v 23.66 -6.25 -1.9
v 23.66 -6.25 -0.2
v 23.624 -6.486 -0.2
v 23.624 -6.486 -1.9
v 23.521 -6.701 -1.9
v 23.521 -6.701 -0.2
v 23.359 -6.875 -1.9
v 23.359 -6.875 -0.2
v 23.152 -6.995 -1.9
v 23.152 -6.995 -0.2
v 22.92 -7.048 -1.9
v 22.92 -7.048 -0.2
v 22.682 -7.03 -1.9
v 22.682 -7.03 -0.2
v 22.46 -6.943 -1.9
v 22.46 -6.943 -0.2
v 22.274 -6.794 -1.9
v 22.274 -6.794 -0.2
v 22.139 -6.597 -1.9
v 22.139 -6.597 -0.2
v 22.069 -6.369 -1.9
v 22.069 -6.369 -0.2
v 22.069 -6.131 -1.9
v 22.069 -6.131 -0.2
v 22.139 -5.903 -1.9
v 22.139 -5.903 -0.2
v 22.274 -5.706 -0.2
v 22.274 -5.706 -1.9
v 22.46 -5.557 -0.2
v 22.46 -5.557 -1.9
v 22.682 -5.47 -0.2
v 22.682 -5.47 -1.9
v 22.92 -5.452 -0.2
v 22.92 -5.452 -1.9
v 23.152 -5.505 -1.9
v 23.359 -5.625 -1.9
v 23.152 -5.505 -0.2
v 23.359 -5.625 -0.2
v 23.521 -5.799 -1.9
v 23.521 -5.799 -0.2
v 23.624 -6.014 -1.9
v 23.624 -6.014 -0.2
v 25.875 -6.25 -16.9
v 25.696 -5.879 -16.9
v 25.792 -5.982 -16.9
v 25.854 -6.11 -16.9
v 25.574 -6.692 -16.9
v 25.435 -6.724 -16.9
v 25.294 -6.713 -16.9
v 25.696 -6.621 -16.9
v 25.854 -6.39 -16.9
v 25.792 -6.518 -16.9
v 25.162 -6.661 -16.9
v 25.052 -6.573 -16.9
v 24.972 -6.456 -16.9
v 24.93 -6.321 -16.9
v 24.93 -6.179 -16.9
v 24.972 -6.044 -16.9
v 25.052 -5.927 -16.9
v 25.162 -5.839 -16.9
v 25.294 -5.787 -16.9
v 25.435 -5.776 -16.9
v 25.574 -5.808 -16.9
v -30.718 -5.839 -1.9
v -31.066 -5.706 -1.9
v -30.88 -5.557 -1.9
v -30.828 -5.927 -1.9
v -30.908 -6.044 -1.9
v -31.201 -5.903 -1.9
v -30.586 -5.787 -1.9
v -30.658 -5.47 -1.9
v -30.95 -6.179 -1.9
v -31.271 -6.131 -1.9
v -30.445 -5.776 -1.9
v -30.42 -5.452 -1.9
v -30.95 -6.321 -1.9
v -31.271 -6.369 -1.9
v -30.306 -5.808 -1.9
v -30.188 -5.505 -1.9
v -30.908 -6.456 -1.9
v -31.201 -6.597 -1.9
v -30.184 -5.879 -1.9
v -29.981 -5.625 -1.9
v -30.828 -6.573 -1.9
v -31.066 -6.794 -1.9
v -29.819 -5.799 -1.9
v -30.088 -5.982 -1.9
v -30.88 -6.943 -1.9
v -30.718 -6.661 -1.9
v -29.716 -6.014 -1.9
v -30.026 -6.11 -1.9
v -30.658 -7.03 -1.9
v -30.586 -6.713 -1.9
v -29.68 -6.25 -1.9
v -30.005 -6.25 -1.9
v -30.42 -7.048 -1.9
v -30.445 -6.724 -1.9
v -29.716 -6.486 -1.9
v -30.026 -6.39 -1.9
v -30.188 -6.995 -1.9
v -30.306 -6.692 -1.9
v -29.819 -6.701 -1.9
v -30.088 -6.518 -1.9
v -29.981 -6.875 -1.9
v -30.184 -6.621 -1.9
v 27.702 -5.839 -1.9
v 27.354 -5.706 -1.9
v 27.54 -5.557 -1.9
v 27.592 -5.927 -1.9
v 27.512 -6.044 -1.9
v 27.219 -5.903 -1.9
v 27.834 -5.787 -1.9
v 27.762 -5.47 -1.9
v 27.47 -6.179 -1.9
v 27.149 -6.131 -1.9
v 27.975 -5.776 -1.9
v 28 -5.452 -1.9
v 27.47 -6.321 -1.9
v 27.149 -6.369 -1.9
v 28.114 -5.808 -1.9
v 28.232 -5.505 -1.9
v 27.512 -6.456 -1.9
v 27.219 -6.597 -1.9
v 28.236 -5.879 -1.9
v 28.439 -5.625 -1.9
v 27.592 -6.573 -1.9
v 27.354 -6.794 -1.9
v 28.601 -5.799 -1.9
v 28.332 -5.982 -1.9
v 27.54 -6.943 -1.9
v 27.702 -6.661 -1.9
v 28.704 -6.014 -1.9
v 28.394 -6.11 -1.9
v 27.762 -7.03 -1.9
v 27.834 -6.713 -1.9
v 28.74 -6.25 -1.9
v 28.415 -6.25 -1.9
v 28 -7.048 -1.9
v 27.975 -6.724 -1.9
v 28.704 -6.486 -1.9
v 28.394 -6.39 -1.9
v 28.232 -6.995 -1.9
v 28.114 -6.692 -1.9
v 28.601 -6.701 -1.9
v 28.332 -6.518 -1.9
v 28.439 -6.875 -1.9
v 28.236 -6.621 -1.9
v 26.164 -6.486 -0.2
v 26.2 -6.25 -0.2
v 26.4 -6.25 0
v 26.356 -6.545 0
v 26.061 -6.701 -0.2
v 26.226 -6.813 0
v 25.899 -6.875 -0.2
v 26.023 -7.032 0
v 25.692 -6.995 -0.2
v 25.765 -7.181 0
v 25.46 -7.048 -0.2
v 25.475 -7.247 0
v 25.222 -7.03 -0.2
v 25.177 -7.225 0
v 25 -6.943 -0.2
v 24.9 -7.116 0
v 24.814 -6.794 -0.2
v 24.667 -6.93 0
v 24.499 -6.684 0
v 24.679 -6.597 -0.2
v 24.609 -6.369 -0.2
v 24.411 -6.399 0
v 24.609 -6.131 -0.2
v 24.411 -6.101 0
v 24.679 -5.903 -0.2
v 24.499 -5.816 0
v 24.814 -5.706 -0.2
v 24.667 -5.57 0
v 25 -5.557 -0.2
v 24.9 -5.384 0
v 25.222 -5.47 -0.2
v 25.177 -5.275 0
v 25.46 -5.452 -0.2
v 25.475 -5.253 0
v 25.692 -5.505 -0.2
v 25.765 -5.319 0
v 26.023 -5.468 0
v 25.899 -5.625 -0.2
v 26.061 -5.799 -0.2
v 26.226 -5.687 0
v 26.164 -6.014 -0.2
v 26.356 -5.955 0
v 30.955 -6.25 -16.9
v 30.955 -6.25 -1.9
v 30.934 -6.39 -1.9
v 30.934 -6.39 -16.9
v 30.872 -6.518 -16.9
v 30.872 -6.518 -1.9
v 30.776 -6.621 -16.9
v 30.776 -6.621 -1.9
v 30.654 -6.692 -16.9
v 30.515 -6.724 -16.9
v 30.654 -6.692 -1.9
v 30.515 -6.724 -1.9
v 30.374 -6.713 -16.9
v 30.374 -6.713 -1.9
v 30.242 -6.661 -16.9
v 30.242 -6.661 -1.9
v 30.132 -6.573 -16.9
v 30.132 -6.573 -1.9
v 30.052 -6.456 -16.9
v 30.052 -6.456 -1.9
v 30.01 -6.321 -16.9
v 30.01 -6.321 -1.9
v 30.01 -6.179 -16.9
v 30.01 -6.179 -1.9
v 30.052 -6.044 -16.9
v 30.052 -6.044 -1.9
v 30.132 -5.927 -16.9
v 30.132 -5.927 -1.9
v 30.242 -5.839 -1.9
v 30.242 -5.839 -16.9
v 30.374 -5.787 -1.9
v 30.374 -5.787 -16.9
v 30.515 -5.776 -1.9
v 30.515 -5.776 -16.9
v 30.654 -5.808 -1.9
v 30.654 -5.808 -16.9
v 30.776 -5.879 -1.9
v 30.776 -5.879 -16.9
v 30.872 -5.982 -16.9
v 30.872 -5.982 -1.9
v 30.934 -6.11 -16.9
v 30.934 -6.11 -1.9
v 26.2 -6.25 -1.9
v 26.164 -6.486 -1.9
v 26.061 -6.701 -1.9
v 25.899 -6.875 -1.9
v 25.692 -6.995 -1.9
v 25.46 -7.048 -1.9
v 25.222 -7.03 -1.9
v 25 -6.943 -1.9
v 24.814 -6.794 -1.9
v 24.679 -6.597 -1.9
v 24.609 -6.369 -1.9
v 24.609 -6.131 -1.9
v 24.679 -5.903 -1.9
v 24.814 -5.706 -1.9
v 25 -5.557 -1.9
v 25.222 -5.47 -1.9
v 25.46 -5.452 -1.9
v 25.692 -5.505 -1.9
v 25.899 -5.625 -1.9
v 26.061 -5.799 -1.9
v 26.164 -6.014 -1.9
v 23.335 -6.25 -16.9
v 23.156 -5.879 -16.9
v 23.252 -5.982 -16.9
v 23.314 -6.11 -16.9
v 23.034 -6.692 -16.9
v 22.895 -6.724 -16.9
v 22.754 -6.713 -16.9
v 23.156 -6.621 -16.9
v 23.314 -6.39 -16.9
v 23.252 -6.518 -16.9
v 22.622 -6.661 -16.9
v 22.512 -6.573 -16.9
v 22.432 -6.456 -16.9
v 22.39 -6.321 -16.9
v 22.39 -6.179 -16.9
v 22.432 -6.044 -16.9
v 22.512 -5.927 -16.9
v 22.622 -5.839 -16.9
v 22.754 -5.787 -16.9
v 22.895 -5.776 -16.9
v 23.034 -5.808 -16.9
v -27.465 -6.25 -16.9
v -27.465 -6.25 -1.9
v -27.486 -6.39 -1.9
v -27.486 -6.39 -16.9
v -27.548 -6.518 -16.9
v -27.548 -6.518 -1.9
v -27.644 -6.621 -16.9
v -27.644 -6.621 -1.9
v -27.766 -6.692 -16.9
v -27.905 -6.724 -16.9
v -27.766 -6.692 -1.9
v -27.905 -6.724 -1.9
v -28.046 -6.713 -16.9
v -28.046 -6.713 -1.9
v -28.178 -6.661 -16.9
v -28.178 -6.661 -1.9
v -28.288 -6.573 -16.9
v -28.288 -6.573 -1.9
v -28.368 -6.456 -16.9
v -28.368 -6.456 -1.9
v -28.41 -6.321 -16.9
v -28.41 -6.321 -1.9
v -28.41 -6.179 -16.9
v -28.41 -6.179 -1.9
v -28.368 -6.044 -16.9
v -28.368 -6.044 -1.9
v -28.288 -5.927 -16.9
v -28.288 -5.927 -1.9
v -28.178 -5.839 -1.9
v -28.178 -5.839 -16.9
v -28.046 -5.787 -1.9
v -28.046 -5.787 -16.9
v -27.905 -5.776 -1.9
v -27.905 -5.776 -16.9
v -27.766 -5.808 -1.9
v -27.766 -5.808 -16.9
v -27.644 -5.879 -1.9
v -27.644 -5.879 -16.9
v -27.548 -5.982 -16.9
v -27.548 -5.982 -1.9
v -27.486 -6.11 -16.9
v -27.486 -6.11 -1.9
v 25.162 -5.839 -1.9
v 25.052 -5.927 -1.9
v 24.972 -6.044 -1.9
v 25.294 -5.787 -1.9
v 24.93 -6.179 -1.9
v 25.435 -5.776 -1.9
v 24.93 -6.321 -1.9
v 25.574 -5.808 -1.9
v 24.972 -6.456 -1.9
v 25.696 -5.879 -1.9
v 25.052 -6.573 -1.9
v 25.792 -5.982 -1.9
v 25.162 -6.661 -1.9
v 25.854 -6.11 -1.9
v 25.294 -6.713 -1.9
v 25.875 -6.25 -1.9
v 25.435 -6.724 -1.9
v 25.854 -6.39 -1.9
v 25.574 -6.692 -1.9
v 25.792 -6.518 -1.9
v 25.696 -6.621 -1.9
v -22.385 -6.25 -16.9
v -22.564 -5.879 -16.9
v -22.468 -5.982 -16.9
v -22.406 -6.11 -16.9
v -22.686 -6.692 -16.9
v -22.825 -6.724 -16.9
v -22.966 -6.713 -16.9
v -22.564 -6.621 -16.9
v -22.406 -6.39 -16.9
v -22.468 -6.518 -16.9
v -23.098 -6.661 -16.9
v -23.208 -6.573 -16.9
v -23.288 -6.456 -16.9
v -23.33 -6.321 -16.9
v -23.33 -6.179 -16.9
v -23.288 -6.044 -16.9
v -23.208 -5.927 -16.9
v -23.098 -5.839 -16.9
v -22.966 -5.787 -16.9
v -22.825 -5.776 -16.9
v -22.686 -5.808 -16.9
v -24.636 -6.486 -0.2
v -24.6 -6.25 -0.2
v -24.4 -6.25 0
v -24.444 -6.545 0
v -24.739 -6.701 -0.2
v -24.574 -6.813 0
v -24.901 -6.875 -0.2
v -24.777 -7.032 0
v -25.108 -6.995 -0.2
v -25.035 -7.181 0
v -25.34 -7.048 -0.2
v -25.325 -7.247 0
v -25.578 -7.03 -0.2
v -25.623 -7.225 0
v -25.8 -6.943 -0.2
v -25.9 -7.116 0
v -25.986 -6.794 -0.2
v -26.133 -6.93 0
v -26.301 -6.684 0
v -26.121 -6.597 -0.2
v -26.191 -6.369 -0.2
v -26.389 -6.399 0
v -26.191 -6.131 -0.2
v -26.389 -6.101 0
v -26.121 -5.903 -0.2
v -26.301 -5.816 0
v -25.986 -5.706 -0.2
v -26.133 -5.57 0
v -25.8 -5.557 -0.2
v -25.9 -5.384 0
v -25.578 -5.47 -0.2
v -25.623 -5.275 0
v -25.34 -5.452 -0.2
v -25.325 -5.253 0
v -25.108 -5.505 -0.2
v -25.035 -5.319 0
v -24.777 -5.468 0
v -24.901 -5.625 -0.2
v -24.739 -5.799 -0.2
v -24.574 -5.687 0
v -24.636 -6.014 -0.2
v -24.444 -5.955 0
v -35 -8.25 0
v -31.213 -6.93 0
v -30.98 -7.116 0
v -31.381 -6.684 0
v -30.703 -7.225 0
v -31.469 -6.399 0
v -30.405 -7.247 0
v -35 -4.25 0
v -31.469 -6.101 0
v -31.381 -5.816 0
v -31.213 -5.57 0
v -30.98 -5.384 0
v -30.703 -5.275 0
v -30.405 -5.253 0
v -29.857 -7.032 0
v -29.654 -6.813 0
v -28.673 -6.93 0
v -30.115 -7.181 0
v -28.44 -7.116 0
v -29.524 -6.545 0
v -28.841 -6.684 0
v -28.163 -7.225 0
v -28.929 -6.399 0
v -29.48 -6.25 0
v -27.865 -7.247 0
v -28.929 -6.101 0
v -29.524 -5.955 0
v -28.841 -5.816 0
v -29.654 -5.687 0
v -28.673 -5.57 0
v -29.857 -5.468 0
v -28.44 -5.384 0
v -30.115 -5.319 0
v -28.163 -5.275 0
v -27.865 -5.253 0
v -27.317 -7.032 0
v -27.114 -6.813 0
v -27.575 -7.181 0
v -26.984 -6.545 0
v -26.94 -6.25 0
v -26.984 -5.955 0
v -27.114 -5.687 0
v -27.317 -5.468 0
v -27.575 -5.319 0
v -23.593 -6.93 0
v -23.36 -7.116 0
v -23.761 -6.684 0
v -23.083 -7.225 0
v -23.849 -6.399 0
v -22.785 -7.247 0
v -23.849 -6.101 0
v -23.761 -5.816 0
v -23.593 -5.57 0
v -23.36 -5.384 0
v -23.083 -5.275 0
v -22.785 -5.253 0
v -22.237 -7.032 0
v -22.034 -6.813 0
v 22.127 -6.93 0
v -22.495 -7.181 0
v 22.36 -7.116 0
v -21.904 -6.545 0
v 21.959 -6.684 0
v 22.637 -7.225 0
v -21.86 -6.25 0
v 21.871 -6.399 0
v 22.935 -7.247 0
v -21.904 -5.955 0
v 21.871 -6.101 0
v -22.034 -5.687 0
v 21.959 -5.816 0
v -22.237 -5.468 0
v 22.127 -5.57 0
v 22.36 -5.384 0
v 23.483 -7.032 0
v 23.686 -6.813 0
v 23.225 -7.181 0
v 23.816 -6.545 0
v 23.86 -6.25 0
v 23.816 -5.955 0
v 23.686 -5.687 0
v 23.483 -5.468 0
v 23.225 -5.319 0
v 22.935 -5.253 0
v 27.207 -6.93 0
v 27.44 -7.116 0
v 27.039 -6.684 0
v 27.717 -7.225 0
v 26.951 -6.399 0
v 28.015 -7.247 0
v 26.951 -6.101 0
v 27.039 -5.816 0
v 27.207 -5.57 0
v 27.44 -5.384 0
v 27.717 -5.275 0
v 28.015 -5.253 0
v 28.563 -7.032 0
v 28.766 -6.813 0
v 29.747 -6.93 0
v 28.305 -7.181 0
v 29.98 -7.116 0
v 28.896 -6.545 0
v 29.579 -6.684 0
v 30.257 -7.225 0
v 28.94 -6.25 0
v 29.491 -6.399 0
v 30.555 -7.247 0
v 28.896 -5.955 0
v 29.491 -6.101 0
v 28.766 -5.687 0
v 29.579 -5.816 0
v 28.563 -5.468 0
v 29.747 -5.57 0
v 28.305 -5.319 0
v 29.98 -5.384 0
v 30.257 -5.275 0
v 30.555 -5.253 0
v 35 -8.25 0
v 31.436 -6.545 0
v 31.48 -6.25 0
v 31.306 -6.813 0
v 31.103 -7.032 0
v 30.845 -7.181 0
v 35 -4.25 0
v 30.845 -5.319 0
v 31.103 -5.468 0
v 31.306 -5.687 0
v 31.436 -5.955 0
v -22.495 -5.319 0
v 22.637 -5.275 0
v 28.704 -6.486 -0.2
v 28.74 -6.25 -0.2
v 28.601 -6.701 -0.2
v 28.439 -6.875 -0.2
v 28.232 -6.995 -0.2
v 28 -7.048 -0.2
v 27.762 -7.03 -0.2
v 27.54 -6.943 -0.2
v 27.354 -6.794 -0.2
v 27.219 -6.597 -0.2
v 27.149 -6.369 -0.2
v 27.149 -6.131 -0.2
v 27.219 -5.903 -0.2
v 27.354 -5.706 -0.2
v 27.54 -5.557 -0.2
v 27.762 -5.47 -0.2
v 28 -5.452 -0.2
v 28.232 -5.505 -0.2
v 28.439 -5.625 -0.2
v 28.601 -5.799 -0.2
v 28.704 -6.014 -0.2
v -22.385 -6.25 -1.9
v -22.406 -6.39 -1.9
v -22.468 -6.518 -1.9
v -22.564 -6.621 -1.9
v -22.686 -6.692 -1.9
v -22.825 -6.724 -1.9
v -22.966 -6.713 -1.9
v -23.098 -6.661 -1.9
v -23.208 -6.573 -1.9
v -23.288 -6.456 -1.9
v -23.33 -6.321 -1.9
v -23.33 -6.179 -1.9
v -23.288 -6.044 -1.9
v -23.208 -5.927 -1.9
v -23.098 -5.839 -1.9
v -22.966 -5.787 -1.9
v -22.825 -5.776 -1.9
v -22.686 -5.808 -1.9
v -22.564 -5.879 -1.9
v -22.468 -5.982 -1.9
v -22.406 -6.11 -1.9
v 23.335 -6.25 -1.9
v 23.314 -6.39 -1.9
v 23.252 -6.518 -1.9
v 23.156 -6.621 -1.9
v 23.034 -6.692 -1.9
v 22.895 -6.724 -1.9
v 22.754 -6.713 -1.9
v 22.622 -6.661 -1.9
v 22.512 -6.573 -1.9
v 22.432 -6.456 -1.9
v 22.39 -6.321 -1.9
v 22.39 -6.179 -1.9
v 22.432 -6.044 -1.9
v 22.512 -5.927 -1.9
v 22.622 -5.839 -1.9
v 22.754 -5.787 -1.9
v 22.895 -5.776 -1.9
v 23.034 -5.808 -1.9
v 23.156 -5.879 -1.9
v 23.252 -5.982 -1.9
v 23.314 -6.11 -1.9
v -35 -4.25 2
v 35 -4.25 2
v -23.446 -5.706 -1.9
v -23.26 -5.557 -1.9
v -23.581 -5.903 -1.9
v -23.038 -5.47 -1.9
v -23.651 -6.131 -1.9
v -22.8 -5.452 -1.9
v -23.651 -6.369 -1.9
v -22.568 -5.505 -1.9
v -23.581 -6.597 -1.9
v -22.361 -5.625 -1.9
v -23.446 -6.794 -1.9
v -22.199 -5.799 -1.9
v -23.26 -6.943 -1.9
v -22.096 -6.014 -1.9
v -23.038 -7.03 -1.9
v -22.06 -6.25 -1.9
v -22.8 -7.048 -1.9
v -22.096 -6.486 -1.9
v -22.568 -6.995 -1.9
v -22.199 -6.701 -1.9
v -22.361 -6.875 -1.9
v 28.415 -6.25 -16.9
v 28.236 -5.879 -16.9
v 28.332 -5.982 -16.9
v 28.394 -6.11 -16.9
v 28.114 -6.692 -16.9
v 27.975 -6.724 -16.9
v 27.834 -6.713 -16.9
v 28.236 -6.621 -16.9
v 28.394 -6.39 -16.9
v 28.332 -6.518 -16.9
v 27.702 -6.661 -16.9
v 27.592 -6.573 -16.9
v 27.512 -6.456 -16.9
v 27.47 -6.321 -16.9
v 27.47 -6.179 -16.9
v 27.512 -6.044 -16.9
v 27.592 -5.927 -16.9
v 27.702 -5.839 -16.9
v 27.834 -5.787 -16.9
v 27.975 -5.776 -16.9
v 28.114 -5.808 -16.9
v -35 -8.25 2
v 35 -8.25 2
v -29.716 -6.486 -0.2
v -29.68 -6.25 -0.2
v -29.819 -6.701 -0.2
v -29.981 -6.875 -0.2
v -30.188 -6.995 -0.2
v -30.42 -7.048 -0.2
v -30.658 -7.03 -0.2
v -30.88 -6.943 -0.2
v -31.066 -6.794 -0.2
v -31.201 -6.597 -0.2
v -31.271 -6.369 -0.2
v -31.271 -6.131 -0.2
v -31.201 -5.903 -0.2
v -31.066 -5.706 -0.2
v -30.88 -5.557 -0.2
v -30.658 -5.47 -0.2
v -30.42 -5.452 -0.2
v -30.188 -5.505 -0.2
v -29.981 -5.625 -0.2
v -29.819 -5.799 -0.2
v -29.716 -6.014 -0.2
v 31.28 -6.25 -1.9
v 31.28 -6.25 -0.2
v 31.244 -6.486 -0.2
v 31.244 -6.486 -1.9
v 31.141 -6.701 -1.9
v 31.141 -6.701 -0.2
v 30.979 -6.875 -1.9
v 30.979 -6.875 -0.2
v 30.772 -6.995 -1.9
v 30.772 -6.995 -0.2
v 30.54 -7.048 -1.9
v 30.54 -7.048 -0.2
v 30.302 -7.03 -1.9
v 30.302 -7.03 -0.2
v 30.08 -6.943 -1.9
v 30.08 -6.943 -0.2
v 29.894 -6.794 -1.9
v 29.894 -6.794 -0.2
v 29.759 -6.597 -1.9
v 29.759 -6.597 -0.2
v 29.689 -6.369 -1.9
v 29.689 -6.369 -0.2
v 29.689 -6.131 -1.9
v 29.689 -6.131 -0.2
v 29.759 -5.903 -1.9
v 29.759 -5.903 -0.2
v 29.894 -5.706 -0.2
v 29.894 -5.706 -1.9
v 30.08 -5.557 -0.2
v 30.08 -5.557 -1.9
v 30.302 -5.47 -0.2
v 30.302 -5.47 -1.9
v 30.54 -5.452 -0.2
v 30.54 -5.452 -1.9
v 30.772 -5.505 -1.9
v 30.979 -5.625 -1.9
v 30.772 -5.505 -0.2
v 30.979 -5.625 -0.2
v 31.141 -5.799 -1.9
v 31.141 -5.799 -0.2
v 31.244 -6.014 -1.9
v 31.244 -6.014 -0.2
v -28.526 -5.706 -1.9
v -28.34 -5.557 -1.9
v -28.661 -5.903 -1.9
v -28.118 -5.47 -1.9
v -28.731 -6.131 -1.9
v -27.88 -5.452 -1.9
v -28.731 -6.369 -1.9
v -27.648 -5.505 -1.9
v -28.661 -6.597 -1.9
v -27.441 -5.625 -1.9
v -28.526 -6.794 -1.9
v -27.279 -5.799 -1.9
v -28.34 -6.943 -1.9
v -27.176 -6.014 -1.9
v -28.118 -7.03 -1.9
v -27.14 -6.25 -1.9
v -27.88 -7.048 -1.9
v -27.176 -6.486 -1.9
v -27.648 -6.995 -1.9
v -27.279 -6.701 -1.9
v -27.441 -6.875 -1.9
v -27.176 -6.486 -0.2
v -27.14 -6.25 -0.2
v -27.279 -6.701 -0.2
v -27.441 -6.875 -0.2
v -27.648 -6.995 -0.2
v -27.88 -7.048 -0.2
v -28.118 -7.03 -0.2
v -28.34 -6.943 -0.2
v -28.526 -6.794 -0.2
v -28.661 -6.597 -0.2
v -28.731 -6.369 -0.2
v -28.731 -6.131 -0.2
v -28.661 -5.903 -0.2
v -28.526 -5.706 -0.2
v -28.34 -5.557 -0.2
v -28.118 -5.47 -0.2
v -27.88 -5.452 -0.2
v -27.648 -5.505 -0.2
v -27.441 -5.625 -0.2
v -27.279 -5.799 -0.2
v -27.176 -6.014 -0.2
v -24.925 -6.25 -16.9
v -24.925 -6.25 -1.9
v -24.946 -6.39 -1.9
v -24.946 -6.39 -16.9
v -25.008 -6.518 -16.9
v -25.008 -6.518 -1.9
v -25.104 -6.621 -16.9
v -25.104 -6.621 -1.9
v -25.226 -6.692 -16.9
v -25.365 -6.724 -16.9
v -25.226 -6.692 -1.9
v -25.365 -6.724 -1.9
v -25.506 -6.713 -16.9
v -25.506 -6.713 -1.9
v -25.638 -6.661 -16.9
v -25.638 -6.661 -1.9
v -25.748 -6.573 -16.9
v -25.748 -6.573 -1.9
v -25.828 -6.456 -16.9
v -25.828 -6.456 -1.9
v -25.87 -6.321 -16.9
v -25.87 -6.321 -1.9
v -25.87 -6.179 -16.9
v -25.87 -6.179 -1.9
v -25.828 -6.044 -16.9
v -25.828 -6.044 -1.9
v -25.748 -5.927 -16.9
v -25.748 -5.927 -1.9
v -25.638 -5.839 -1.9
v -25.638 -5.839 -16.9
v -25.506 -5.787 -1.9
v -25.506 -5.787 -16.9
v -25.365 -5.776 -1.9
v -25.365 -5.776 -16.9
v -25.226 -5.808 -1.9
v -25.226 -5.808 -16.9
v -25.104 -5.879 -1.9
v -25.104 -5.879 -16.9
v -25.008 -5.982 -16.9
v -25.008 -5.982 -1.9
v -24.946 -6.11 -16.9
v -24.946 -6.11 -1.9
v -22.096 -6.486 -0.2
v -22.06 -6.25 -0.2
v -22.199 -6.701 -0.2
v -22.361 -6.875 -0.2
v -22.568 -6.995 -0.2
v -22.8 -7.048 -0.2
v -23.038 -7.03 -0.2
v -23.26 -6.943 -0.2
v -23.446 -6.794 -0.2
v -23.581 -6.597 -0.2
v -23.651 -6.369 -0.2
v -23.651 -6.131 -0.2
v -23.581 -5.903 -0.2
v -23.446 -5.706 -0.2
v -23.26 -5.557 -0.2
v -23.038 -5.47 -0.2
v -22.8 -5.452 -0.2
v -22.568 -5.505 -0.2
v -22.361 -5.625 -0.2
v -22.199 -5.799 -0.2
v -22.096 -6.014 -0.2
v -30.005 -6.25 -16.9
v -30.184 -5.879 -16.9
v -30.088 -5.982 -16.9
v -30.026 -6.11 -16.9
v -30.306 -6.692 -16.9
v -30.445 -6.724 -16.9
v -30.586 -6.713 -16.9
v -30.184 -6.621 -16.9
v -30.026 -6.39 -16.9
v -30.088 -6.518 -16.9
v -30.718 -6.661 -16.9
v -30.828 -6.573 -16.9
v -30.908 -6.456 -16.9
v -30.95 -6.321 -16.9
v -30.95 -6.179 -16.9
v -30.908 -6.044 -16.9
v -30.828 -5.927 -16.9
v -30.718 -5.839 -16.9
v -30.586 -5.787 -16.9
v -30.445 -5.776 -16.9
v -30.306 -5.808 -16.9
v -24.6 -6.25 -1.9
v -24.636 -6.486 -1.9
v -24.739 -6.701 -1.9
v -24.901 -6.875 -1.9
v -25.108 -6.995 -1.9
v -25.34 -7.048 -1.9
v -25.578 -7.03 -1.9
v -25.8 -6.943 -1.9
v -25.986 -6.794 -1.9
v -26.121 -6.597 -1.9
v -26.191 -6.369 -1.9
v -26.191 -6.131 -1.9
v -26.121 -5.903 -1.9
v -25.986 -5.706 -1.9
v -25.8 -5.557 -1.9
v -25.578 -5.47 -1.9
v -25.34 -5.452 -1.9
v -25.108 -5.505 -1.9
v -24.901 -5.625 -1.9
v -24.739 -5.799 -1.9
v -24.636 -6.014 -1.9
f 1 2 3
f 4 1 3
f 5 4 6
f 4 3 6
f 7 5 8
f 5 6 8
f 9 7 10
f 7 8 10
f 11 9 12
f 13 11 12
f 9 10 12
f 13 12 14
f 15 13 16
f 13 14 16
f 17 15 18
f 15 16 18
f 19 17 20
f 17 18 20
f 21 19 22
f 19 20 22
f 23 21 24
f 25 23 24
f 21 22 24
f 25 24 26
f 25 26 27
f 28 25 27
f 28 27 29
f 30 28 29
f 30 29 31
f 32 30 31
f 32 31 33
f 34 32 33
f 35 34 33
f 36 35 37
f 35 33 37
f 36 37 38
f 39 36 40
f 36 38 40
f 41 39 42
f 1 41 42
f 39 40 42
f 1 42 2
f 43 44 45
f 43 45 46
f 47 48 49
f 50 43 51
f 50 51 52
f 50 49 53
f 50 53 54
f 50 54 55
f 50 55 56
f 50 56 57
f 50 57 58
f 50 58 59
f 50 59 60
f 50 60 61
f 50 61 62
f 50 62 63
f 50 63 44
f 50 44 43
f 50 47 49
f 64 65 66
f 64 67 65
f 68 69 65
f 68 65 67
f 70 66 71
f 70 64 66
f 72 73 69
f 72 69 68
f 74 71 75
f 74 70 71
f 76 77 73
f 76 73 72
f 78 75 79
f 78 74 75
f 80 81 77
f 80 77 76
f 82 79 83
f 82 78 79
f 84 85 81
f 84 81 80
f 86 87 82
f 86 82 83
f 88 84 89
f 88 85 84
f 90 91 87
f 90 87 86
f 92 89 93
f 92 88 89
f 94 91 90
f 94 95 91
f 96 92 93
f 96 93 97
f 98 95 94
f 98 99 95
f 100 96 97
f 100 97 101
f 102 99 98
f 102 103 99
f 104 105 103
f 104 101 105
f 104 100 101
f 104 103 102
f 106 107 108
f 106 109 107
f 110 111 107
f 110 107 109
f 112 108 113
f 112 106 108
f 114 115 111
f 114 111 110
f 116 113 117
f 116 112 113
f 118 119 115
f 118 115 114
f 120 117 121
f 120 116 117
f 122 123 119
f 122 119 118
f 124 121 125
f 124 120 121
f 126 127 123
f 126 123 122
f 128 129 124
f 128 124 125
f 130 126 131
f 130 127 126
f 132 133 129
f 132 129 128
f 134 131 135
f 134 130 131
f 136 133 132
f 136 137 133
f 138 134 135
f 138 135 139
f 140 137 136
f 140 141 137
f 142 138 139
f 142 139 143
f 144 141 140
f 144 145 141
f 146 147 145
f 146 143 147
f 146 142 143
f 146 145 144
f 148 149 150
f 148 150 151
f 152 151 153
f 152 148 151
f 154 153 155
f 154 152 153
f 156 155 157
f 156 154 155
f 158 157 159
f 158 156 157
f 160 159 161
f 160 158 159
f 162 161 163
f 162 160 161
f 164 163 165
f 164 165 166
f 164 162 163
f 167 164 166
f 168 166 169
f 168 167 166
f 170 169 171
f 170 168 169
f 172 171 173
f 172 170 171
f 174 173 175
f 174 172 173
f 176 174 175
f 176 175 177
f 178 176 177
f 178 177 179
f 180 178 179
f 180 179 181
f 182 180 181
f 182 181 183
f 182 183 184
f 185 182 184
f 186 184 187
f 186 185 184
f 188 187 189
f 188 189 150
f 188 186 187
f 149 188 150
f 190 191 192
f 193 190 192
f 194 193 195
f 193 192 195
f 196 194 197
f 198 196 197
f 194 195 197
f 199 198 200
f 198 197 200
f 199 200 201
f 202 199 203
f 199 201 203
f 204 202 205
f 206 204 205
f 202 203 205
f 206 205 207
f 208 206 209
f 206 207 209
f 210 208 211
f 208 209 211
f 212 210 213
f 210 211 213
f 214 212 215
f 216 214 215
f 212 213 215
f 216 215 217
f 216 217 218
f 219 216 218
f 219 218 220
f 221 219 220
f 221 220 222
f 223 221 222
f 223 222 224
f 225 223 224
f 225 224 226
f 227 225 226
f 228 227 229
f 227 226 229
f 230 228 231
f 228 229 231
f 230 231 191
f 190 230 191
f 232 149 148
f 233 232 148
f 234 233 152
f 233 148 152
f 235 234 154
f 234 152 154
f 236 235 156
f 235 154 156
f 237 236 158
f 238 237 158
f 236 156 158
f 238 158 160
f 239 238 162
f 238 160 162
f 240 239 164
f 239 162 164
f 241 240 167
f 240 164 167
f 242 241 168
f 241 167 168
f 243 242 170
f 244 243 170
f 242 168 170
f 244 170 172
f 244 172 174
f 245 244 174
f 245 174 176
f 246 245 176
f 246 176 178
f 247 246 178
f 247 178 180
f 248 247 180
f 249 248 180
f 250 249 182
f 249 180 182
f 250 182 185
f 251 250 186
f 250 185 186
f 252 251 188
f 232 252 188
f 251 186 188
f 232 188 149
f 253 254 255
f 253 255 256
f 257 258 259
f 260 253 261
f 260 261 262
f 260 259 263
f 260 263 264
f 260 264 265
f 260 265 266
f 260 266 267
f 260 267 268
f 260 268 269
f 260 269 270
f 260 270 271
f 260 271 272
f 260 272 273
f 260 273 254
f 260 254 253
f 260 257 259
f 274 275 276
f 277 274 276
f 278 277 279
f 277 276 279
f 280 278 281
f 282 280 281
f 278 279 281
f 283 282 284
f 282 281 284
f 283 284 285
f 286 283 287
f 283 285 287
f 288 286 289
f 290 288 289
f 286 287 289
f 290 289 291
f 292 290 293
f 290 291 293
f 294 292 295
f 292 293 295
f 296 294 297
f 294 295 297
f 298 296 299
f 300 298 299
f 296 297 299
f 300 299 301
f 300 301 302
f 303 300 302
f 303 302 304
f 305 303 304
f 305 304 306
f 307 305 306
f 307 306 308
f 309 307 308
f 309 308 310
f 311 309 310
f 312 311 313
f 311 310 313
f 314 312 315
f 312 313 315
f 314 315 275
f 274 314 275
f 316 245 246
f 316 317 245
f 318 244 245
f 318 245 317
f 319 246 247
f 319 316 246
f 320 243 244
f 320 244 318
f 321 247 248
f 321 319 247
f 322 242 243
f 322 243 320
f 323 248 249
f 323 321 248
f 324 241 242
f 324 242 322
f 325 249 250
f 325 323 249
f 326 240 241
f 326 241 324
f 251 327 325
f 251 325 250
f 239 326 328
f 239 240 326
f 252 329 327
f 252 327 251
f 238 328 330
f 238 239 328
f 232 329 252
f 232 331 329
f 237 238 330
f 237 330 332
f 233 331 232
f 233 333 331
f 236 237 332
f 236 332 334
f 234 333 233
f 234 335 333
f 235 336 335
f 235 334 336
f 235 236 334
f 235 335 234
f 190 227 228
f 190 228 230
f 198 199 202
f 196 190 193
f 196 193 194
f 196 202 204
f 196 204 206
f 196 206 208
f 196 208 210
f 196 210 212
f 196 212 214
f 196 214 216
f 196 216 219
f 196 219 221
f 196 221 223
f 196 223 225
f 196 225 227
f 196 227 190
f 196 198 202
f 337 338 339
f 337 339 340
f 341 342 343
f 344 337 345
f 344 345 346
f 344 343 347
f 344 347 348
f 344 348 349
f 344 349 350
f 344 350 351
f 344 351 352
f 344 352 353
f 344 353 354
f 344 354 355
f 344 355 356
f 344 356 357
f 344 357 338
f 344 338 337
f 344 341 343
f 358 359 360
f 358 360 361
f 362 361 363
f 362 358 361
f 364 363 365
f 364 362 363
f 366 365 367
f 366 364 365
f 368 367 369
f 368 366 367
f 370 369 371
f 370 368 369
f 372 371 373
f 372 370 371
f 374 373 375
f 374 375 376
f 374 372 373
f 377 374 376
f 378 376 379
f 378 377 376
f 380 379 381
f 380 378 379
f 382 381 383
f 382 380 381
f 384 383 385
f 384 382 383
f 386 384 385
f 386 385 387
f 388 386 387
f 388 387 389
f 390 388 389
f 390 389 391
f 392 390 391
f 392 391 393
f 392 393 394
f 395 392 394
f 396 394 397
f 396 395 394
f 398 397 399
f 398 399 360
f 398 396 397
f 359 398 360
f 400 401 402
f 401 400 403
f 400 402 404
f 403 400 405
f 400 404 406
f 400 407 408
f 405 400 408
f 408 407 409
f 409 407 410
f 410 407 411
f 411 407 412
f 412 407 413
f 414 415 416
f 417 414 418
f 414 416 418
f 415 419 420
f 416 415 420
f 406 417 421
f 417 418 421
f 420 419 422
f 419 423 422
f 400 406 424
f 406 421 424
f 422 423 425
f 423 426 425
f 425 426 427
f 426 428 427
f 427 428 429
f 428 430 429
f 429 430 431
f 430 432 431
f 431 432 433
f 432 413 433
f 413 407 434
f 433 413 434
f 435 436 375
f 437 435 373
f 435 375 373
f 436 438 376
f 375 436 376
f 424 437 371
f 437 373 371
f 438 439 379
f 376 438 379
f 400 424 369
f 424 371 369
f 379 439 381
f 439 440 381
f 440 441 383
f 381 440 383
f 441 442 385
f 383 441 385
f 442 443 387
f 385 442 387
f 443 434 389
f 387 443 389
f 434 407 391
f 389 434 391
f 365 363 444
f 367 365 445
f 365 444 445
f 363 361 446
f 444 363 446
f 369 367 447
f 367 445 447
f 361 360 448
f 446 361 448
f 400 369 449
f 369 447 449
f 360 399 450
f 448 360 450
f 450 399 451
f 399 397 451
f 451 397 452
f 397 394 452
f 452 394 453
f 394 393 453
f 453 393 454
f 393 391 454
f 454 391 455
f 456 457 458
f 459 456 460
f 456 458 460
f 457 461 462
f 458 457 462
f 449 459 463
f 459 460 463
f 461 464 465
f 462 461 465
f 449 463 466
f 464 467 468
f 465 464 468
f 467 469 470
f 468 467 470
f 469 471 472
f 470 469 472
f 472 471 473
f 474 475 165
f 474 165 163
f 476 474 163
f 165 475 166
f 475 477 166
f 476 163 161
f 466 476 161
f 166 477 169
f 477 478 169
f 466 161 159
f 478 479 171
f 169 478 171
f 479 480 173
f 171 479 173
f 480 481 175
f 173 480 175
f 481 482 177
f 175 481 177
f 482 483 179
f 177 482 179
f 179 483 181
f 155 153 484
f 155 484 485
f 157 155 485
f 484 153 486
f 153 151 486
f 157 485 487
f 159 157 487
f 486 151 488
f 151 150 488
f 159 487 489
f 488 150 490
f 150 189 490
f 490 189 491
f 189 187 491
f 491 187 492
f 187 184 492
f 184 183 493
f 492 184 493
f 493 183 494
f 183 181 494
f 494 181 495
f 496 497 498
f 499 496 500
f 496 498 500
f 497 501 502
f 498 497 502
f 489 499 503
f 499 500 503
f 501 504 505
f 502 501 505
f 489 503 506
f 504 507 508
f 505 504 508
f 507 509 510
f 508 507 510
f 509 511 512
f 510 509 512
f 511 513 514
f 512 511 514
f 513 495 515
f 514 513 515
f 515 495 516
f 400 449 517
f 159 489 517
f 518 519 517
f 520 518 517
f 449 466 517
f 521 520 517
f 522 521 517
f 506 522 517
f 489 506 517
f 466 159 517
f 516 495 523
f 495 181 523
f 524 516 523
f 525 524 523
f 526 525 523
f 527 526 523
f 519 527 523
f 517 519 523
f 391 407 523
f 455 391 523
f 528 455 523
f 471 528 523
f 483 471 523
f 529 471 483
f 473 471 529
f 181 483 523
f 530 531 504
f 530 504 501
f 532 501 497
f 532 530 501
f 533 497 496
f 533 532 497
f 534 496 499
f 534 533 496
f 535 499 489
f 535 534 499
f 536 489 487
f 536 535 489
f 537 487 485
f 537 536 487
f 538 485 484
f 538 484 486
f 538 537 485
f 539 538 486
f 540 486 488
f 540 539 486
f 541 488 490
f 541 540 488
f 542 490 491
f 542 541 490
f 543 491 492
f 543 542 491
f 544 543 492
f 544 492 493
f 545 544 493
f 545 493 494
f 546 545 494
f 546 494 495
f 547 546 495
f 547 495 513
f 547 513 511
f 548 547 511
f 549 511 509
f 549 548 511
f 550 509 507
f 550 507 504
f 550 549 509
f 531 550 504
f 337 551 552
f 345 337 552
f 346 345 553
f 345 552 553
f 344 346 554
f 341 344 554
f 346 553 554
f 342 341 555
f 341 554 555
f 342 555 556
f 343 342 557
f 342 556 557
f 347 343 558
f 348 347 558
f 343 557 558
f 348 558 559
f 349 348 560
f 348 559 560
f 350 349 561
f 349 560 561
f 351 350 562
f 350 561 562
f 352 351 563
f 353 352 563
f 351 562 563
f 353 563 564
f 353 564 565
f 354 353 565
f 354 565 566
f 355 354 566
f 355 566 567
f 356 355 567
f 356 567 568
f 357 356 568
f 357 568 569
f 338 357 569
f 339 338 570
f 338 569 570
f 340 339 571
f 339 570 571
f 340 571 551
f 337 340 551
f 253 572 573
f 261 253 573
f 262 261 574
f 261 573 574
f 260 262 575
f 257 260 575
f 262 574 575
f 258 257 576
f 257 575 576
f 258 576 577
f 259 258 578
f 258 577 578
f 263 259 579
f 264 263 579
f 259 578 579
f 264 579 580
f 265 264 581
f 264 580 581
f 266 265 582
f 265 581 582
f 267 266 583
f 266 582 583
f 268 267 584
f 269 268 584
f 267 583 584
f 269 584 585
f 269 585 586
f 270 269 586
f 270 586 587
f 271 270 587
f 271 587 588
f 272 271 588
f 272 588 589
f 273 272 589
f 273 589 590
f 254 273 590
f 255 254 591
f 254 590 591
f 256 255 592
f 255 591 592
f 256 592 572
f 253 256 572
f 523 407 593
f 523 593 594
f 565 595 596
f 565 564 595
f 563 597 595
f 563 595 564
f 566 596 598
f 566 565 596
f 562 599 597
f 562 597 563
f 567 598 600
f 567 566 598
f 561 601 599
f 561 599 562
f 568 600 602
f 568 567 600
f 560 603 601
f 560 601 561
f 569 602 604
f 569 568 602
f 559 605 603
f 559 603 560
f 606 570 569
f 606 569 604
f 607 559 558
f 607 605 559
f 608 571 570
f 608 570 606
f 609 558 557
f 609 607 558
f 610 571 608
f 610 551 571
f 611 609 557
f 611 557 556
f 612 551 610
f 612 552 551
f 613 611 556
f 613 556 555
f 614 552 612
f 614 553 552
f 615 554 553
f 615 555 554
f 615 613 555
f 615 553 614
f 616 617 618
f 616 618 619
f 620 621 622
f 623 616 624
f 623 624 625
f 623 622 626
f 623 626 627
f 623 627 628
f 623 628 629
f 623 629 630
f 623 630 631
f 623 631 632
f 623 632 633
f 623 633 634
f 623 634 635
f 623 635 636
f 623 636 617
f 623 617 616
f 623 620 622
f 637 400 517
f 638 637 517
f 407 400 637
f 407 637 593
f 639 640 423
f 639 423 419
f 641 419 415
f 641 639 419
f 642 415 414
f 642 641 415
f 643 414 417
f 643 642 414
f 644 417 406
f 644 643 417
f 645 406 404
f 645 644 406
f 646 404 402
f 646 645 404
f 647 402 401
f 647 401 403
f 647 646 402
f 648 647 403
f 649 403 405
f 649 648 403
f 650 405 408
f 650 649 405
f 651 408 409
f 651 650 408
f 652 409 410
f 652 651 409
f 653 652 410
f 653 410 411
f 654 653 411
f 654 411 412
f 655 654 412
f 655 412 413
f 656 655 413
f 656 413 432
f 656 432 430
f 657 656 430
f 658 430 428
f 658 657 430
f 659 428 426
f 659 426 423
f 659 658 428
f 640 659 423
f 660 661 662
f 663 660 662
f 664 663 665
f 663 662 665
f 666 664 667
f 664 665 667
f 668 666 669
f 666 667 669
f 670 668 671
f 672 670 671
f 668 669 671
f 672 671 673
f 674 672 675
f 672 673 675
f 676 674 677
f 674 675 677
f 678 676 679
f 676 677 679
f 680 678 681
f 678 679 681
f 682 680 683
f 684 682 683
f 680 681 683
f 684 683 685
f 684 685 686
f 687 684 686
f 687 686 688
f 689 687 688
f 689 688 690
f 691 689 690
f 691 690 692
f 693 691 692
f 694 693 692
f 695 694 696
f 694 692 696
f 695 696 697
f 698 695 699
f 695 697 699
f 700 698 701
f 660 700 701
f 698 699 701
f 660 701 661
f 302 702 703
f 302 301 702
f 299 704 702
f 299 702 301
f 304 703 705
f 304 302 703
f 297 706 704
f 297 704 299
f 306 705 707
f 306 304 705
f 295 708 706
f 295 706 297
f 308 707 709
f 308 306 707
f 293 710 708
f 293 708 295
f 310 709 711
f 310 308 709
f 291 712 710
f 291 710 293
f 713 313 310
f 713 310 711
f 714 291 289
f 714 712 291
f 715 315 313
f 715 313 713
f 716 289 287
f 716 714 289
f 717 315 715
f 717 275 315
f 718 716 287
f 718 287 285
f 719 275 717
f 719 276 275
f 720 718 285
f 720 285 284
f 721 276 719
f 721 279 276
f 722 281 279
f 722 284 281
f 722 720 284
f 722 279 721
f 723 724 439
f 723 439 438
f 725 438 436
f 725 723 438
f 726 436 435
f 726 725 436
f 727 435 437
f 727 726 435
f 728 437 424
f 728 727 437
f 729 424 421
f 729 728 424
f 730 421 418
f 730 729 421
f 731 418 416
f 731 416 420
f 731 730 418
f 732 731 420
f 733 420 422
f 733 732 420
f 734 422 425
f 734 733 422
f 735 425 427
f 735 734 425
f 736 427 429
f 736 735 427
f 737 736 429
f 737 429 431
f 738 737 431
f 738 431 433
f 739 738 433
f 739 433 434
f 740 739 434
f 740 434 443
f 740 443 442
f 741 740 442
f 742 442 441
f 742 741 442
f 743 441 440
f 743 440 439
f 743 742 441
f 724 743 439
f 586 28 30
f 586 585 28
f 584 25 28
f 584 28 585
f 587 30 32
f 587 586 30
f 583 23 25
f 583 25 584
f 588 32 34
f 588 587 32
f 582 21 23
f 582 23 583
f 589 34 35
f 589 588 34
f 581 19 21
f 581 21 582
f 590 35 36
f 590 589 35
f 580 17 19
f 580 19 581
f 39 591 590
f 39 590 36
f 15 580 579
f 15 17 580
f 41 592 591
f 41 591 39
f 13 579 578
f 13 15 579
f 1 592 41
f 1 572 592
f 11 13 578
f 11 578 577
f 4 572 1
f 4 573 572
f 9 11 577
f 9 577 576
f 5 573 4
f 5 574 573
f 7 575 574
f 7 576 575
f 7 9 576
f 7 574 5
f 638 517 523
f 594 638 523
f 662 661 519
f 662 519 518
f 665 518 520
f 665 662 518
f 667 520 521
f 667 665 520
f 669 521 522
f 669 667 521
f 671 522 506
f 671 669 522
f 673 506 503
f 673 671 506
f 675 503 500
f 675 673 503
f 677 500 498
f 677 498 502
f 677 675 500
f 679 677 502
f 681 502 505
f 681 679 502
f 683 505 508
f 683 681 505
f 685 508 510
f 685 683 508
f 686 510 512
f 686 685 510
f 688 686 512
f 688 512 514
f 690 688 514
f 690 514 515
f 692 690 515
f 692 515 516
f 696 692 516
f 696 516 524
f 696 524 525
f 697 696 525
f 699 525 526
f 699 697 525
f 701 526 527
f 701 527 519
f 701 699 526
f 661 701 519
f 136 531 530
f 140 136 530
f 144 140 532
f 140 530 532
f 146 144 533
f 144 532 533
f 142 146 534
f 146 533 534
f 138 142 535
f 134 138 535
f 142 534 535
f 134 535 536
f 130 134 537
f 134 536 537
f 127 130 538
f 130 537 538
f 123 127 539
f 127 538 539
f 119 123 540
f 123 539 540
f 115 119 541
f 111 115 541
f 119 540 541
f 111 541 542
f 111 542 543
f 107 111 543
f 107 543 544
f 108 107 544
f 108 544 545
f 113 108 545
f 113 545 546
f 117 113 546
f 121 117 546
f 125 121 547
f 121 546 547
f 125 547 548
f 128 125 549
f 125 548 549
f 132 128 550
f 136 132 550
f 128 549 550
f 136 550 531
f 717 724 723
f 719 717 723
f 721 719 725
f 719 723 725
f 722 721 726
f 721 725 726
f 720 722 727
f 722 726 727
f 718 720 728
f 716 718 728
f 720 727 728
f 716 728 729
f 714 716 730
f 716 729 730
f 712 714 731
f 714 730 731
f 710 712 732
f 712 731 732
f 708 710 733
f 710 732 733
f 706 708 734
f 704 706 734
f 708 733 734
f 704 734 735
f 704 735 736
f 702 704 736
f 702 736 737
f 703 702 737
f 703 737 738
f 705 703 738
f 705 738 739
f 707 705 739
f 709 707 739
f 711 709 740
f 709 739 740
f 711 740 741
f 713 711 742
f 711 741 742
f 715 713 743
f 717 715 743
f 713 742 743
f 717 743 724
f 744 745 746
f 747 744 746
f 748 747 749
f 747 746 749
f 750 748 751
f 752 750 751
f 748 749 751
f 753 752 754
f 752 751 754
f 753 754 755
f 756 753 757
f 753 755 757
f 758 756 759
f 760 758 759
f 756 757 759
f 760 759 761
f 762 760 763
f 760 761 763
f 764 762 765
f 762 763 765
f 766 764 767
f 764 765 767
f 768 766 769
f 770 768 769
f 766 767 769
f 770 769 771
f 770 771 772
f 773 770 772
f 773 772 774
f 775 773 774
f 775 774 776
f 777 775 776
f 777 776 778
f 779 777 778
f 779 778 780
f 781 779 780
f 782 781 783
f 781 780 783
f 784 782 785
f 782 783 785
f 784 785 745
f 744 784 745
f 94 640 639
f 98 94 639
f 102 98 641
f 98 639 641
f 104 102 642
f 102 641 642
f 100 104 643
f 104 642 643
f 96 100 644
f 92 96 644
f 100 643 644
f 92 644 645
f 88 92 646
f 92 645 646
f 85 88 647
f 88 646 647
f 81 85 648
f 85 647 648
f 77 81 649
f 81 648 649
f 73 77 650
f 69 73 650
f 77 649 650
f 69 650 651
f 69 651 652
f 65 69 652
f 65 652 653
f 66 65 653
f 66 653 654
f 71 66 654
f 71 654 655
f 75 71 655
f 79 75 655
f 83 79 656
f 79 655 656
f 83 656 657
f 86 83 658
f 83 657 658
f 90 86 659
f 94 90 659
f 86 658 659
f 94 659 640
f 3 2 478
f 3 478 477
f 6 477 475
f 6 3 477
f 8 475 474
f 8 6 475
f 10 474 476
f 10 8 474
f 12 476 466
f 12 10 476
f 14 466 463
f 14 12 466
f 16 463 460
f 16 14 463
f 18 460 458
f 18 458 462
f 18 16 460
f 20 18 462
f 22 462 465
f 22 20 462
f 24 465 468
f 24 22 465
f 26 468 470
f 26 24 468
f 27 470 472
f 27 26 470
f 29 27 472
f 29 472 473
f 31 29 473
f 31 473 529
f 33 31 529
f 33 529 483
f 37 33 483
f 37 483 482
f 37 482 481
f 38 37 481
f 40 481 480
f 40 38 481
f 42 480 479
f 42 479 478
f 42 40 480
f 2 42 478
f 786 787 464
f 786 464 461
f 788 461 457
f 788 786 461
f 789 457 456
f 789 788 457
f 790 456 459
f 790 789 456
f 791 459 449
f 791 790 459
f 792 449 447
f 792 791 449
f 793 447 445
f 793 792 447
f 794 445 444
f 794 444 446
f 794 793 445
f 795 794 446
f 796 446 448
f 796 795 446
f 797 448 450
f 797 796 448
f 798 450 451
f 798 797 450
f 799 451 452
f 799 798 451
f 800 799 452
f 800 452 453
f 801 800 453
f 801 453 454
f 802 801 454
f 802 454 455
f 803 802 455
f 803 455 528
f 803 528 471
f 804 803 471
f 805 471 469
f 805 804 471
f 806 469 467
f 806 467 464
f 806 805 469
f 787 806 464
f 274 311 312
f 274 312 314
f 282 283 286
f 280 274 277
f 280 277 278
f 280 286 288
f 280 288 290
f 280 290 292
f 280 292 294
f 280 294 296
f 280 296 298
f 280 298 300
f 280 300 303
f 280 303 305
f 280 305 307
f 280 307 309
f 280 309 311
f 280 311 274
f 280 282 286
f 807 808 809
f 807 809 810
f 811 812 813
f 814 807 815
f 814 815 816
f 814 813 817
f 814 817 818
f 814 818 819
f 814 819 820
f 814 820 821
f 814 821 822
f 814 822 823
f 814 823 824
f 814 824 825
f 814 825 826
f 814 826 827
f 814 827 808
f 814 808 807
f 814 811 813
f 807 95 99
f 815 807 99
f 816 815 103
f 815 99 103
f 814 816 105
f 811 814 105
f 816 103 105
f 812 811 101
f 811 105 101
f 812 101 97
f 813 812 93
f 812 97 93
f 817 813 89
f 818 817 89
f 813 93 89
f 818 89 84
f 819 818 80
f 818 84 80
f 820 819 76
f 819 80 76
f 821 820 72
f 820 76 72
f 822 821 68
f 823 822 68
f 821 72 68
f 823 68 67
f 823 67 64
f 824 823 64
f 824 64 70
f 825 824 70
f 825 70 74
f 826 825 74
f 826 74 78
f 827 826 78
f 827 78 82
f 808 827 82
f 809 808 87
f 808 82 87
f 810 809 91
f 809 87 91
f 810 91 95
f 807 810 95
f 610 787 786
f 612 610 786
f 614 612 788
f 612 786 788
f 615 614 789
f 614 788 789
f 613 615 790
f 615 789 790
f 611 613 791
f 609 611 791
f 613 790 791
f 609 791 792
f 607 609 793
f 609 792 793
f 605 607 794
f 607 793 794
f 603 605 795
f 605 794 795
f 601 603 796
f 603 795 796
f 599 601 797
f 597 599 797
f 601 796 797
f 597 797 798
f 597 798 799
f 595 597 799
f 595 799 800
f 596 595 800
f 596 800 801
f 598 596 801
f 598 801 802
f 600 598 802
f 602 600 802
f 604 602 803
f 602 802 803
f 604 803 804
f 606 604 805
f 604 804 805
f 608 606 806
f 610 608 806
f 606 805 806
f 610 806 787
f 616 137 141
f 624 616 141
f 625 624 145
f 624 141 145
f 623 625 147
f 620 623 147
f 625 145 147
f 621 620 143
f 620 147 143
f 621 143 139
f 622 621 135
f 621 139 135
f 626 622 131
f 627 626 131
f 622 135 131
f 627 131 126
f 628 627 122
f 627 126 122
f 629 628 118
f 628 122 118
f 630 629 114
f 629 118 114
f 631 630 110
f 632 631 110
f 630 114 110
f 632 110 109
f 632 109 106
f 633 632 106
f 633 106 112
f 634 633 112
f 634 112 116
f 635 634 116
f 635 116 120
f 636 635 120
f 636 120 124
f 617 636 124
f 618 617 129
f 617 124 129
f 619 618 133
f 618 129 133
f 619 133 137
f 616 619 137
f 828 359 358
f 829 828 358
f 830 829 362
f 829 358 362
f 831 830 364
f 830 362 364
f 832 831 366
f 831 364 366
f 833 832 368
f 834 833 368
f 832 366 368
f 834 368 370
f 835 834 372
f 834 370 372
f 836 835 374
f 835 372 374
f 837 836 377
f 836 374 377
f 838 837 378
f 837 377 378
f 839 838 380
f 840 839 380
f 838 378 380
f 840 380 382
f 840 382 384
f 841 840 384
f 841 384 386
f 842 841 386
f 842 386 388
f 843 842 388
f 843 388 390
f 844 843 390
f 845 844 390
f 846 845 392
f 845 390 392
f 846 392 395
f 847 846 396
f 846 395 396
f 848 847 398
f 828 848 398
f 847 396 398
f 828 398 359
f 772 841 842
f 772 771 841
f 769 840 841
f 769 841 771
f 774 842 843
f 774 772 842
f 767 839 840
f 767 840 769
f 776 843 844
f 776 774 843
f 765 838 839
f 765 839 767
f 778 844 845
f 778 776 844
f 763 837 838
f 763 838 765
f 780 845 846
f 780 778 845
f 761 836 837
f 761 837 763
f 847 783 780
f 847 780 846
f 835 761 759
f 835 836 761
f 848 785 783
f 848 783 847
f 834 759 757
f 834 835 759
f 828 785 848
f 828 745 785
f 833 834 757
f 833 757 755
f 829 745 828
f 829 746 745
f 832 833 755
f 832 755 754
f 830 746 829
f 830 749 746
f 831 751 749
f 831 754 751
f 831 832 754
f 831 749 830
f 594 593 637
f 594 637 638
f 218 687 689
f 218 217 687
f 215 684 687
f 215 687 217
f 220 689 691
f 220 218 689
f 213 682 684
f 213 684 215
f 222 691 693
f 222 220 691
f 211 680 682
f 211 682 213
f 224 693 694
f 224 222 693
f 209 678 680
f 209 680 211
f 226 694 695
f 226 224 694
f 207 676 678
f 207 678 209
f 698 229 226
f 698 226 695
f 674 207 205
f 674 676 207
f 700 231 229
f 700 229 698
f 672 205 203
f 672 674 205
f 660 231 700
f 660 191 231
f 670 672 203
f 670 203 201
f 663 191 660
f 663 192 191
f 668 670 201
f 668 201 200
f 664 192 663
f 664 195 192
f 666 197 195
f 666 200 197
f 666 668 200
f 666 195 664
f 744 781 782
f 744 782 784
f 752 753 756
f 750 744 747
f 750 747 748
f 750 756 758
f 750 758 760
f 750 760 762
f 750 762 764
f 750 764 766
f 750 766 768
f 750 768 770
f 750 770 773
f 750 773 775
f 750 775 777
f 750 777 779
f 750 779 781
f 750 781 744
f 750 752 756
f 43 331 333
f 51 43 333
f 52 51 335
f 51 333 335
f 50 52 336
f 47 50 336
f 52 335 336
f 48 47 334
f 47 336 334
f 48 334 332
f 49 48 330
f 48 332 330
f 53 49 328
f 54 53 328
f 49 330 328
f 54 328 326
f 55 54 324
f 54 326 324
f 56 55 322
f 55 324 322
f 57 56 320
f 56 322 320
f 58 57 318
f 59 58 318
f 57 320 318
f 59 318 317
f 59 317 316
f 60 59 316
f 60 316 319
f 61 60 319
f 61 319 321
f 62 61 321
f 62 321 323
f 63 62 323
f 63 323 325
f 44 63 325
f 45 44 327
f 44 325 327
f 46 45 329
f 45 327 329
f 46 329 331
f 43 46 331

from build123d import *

# Parameters (mm, degrees)
SKETCH_W     = 70
SKETCH_H     = 4
PAD_DEPTH    = 2
SKETCH001_R  = 0.8
PAD001_DEPTH = 1.9
SKETCH002_R  = 0.475
PAD002_DEPTH = 15
CHAMFER_SIZE = 0.2


with BuildPart() as part:
    # Sketch → Pad (new body)
    with BuildSketch(Plane.XY):
        with Locations((0, -6.25)):
            Rectangle(SKETCH_W, SKETCH_H)
    extrude(amount=PAD_DEPTH)

    # Sketch001 (on Face5 of Pad) → Pad001 (join)
    with BuildSketch(Plane(origin=(0, 0, 0), x_dir=(1, 0, 0), z_dir=(0, 0, -1))):
        with Locations((-30.48, 6.25)):
            Circle(SKETCH001_R)
        with Locations((-22.86, 6.25)):
            Circle(SKETCH001_R)
        with Locations((-25.4, 6.25)):
            Circle(SKETCH001_R)
        with Locations((-27.94, 6.25)):
            Circle(SKETCH001_R)
        with Locations((22.86, 6.25)):
            Circle(SKETCH001_R)
        with Locations((25.4, 6.25)):
            Circle(SKETCH001_R)
        with Locations((27.94, 6.25)):
            Circle(SKETCH001_R)
        with Locations((30.48, 6.25)):
            Circle(SKETCH001_R)
    extrude(amount=PAD001_DEPTH)

    # Sketch002 (on Face17 of Pad001) → Pad002 (join)
    with BuildSketch(Plane(origin=(0, 0, -1.9), x_dir=(1, 0, 0), z_dir=(0, 0, -1))):
        with Locations((-30.48, 6.25)):
            Circle(SKETCH002_R)
        with Locations((-27.94, 6.25)):
            Circle(SKETCH002_R)
        with Locations((-25.4, 6.25)):
            Circle(SKETCH002_R)
        with Locations((-22.86, 6.25)):
            Circle(SKETCH002_R)
        with Locations((22.86, 6.25)):
            Circle(SKETCH002_R)
        with Locations((27.94, 6.25)):
            Circle(SKETCH002_R)
        with Locations((25.4, 6.25)):
            Circle(SKETCH002_R)
        with Locations((30.48, 6.25)):
            Circle(SKETCH002_R)
    extrude(amount=PAD002_DEPTH)

    # Chamfer
    chamfer_edges = [part.edges().sort_by_distance(p)[0] for p in [
        (-23.66, -6.25, 0),
        (-26.2, -6.25, 0),
        (-28.74, -6.25, 0),
        (-31.28, -6.25, 0),
        (22.06, -6.25, 0),
        (27.14, -6.25, 0),
        (24.6, -6.25, 0),
        (29.68, -6.25, 0),
    ]]
    chamfer(chamfer_edges, length=CHAMFER_SIZE)


solid = part.part
